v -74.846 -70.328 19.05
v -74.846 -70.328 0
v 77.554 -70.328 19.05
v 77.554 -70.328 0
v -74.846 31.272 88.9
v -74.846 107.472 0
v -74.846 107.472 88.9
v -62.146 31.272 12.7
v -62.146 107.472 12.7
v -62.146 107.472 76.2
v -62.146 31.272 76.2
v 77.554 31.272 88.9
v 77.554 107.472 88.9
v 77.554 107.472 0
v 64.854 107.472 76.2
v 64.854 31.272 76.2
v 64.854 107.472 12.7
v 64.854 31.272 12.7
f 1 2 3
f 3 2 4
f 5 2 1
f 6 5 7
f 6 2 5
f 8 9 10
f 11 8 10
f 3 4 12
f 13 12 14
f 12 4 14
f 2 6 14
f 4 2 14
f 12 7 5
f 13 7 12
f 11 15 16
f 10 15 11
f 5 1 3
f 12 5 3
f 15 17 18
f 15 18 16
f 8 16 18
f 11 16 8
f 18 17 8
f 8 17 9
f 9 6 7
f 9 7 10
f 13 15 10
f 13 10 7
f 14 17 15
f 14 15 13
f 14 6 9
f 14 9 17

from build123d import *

# Parameters (mm, degrees)
F0_W     = 152.4
F0_H     = 177.8
F1_DEPTH = 88.9
F2_SIZE2 = 69.85
F2_SIZE  = 101.6
F3_W     = 127
F3_H     = 63.5
F4_DEPTH = 76.2


with BuildPart() as f1:
    # F0 (on Top) → F1 (new body)
    with BuildSketch(Plane.XY):
        with Locations((1.3535544276, 18.5724278663)):
            Rectangle(F0_W, F0_H)
    extrude(amount=F1_DEPTH)

    # F2
    f2_edges = [f1.edges().sort_by_distance(p)[0] for p in [
        (1.353554, -70.327572, 88.9),
    ]]
    f2_side = f1.faces().sort_by_distance((1.353554, 18.572428, 88.9))[0]
    chamfer(f2_edges, length=F2_SIZE, length2=F2_SIZE2, reference=f2_side)

    # F3 (on face) → F4 (cut)
    with BuildSketch(Plane(origin=(0, 107.4724278663, 0), x_dir=(-1, 0, 0), z_dir=(0, 1, 0))):
        with Locations((-1.3535544276, 44.45)):
            Rectangle(F3_W, F3_H)
    extrude(amount=-F4_DEPTH, mode=Mode.SUBTRACT)


solid = f1.part
